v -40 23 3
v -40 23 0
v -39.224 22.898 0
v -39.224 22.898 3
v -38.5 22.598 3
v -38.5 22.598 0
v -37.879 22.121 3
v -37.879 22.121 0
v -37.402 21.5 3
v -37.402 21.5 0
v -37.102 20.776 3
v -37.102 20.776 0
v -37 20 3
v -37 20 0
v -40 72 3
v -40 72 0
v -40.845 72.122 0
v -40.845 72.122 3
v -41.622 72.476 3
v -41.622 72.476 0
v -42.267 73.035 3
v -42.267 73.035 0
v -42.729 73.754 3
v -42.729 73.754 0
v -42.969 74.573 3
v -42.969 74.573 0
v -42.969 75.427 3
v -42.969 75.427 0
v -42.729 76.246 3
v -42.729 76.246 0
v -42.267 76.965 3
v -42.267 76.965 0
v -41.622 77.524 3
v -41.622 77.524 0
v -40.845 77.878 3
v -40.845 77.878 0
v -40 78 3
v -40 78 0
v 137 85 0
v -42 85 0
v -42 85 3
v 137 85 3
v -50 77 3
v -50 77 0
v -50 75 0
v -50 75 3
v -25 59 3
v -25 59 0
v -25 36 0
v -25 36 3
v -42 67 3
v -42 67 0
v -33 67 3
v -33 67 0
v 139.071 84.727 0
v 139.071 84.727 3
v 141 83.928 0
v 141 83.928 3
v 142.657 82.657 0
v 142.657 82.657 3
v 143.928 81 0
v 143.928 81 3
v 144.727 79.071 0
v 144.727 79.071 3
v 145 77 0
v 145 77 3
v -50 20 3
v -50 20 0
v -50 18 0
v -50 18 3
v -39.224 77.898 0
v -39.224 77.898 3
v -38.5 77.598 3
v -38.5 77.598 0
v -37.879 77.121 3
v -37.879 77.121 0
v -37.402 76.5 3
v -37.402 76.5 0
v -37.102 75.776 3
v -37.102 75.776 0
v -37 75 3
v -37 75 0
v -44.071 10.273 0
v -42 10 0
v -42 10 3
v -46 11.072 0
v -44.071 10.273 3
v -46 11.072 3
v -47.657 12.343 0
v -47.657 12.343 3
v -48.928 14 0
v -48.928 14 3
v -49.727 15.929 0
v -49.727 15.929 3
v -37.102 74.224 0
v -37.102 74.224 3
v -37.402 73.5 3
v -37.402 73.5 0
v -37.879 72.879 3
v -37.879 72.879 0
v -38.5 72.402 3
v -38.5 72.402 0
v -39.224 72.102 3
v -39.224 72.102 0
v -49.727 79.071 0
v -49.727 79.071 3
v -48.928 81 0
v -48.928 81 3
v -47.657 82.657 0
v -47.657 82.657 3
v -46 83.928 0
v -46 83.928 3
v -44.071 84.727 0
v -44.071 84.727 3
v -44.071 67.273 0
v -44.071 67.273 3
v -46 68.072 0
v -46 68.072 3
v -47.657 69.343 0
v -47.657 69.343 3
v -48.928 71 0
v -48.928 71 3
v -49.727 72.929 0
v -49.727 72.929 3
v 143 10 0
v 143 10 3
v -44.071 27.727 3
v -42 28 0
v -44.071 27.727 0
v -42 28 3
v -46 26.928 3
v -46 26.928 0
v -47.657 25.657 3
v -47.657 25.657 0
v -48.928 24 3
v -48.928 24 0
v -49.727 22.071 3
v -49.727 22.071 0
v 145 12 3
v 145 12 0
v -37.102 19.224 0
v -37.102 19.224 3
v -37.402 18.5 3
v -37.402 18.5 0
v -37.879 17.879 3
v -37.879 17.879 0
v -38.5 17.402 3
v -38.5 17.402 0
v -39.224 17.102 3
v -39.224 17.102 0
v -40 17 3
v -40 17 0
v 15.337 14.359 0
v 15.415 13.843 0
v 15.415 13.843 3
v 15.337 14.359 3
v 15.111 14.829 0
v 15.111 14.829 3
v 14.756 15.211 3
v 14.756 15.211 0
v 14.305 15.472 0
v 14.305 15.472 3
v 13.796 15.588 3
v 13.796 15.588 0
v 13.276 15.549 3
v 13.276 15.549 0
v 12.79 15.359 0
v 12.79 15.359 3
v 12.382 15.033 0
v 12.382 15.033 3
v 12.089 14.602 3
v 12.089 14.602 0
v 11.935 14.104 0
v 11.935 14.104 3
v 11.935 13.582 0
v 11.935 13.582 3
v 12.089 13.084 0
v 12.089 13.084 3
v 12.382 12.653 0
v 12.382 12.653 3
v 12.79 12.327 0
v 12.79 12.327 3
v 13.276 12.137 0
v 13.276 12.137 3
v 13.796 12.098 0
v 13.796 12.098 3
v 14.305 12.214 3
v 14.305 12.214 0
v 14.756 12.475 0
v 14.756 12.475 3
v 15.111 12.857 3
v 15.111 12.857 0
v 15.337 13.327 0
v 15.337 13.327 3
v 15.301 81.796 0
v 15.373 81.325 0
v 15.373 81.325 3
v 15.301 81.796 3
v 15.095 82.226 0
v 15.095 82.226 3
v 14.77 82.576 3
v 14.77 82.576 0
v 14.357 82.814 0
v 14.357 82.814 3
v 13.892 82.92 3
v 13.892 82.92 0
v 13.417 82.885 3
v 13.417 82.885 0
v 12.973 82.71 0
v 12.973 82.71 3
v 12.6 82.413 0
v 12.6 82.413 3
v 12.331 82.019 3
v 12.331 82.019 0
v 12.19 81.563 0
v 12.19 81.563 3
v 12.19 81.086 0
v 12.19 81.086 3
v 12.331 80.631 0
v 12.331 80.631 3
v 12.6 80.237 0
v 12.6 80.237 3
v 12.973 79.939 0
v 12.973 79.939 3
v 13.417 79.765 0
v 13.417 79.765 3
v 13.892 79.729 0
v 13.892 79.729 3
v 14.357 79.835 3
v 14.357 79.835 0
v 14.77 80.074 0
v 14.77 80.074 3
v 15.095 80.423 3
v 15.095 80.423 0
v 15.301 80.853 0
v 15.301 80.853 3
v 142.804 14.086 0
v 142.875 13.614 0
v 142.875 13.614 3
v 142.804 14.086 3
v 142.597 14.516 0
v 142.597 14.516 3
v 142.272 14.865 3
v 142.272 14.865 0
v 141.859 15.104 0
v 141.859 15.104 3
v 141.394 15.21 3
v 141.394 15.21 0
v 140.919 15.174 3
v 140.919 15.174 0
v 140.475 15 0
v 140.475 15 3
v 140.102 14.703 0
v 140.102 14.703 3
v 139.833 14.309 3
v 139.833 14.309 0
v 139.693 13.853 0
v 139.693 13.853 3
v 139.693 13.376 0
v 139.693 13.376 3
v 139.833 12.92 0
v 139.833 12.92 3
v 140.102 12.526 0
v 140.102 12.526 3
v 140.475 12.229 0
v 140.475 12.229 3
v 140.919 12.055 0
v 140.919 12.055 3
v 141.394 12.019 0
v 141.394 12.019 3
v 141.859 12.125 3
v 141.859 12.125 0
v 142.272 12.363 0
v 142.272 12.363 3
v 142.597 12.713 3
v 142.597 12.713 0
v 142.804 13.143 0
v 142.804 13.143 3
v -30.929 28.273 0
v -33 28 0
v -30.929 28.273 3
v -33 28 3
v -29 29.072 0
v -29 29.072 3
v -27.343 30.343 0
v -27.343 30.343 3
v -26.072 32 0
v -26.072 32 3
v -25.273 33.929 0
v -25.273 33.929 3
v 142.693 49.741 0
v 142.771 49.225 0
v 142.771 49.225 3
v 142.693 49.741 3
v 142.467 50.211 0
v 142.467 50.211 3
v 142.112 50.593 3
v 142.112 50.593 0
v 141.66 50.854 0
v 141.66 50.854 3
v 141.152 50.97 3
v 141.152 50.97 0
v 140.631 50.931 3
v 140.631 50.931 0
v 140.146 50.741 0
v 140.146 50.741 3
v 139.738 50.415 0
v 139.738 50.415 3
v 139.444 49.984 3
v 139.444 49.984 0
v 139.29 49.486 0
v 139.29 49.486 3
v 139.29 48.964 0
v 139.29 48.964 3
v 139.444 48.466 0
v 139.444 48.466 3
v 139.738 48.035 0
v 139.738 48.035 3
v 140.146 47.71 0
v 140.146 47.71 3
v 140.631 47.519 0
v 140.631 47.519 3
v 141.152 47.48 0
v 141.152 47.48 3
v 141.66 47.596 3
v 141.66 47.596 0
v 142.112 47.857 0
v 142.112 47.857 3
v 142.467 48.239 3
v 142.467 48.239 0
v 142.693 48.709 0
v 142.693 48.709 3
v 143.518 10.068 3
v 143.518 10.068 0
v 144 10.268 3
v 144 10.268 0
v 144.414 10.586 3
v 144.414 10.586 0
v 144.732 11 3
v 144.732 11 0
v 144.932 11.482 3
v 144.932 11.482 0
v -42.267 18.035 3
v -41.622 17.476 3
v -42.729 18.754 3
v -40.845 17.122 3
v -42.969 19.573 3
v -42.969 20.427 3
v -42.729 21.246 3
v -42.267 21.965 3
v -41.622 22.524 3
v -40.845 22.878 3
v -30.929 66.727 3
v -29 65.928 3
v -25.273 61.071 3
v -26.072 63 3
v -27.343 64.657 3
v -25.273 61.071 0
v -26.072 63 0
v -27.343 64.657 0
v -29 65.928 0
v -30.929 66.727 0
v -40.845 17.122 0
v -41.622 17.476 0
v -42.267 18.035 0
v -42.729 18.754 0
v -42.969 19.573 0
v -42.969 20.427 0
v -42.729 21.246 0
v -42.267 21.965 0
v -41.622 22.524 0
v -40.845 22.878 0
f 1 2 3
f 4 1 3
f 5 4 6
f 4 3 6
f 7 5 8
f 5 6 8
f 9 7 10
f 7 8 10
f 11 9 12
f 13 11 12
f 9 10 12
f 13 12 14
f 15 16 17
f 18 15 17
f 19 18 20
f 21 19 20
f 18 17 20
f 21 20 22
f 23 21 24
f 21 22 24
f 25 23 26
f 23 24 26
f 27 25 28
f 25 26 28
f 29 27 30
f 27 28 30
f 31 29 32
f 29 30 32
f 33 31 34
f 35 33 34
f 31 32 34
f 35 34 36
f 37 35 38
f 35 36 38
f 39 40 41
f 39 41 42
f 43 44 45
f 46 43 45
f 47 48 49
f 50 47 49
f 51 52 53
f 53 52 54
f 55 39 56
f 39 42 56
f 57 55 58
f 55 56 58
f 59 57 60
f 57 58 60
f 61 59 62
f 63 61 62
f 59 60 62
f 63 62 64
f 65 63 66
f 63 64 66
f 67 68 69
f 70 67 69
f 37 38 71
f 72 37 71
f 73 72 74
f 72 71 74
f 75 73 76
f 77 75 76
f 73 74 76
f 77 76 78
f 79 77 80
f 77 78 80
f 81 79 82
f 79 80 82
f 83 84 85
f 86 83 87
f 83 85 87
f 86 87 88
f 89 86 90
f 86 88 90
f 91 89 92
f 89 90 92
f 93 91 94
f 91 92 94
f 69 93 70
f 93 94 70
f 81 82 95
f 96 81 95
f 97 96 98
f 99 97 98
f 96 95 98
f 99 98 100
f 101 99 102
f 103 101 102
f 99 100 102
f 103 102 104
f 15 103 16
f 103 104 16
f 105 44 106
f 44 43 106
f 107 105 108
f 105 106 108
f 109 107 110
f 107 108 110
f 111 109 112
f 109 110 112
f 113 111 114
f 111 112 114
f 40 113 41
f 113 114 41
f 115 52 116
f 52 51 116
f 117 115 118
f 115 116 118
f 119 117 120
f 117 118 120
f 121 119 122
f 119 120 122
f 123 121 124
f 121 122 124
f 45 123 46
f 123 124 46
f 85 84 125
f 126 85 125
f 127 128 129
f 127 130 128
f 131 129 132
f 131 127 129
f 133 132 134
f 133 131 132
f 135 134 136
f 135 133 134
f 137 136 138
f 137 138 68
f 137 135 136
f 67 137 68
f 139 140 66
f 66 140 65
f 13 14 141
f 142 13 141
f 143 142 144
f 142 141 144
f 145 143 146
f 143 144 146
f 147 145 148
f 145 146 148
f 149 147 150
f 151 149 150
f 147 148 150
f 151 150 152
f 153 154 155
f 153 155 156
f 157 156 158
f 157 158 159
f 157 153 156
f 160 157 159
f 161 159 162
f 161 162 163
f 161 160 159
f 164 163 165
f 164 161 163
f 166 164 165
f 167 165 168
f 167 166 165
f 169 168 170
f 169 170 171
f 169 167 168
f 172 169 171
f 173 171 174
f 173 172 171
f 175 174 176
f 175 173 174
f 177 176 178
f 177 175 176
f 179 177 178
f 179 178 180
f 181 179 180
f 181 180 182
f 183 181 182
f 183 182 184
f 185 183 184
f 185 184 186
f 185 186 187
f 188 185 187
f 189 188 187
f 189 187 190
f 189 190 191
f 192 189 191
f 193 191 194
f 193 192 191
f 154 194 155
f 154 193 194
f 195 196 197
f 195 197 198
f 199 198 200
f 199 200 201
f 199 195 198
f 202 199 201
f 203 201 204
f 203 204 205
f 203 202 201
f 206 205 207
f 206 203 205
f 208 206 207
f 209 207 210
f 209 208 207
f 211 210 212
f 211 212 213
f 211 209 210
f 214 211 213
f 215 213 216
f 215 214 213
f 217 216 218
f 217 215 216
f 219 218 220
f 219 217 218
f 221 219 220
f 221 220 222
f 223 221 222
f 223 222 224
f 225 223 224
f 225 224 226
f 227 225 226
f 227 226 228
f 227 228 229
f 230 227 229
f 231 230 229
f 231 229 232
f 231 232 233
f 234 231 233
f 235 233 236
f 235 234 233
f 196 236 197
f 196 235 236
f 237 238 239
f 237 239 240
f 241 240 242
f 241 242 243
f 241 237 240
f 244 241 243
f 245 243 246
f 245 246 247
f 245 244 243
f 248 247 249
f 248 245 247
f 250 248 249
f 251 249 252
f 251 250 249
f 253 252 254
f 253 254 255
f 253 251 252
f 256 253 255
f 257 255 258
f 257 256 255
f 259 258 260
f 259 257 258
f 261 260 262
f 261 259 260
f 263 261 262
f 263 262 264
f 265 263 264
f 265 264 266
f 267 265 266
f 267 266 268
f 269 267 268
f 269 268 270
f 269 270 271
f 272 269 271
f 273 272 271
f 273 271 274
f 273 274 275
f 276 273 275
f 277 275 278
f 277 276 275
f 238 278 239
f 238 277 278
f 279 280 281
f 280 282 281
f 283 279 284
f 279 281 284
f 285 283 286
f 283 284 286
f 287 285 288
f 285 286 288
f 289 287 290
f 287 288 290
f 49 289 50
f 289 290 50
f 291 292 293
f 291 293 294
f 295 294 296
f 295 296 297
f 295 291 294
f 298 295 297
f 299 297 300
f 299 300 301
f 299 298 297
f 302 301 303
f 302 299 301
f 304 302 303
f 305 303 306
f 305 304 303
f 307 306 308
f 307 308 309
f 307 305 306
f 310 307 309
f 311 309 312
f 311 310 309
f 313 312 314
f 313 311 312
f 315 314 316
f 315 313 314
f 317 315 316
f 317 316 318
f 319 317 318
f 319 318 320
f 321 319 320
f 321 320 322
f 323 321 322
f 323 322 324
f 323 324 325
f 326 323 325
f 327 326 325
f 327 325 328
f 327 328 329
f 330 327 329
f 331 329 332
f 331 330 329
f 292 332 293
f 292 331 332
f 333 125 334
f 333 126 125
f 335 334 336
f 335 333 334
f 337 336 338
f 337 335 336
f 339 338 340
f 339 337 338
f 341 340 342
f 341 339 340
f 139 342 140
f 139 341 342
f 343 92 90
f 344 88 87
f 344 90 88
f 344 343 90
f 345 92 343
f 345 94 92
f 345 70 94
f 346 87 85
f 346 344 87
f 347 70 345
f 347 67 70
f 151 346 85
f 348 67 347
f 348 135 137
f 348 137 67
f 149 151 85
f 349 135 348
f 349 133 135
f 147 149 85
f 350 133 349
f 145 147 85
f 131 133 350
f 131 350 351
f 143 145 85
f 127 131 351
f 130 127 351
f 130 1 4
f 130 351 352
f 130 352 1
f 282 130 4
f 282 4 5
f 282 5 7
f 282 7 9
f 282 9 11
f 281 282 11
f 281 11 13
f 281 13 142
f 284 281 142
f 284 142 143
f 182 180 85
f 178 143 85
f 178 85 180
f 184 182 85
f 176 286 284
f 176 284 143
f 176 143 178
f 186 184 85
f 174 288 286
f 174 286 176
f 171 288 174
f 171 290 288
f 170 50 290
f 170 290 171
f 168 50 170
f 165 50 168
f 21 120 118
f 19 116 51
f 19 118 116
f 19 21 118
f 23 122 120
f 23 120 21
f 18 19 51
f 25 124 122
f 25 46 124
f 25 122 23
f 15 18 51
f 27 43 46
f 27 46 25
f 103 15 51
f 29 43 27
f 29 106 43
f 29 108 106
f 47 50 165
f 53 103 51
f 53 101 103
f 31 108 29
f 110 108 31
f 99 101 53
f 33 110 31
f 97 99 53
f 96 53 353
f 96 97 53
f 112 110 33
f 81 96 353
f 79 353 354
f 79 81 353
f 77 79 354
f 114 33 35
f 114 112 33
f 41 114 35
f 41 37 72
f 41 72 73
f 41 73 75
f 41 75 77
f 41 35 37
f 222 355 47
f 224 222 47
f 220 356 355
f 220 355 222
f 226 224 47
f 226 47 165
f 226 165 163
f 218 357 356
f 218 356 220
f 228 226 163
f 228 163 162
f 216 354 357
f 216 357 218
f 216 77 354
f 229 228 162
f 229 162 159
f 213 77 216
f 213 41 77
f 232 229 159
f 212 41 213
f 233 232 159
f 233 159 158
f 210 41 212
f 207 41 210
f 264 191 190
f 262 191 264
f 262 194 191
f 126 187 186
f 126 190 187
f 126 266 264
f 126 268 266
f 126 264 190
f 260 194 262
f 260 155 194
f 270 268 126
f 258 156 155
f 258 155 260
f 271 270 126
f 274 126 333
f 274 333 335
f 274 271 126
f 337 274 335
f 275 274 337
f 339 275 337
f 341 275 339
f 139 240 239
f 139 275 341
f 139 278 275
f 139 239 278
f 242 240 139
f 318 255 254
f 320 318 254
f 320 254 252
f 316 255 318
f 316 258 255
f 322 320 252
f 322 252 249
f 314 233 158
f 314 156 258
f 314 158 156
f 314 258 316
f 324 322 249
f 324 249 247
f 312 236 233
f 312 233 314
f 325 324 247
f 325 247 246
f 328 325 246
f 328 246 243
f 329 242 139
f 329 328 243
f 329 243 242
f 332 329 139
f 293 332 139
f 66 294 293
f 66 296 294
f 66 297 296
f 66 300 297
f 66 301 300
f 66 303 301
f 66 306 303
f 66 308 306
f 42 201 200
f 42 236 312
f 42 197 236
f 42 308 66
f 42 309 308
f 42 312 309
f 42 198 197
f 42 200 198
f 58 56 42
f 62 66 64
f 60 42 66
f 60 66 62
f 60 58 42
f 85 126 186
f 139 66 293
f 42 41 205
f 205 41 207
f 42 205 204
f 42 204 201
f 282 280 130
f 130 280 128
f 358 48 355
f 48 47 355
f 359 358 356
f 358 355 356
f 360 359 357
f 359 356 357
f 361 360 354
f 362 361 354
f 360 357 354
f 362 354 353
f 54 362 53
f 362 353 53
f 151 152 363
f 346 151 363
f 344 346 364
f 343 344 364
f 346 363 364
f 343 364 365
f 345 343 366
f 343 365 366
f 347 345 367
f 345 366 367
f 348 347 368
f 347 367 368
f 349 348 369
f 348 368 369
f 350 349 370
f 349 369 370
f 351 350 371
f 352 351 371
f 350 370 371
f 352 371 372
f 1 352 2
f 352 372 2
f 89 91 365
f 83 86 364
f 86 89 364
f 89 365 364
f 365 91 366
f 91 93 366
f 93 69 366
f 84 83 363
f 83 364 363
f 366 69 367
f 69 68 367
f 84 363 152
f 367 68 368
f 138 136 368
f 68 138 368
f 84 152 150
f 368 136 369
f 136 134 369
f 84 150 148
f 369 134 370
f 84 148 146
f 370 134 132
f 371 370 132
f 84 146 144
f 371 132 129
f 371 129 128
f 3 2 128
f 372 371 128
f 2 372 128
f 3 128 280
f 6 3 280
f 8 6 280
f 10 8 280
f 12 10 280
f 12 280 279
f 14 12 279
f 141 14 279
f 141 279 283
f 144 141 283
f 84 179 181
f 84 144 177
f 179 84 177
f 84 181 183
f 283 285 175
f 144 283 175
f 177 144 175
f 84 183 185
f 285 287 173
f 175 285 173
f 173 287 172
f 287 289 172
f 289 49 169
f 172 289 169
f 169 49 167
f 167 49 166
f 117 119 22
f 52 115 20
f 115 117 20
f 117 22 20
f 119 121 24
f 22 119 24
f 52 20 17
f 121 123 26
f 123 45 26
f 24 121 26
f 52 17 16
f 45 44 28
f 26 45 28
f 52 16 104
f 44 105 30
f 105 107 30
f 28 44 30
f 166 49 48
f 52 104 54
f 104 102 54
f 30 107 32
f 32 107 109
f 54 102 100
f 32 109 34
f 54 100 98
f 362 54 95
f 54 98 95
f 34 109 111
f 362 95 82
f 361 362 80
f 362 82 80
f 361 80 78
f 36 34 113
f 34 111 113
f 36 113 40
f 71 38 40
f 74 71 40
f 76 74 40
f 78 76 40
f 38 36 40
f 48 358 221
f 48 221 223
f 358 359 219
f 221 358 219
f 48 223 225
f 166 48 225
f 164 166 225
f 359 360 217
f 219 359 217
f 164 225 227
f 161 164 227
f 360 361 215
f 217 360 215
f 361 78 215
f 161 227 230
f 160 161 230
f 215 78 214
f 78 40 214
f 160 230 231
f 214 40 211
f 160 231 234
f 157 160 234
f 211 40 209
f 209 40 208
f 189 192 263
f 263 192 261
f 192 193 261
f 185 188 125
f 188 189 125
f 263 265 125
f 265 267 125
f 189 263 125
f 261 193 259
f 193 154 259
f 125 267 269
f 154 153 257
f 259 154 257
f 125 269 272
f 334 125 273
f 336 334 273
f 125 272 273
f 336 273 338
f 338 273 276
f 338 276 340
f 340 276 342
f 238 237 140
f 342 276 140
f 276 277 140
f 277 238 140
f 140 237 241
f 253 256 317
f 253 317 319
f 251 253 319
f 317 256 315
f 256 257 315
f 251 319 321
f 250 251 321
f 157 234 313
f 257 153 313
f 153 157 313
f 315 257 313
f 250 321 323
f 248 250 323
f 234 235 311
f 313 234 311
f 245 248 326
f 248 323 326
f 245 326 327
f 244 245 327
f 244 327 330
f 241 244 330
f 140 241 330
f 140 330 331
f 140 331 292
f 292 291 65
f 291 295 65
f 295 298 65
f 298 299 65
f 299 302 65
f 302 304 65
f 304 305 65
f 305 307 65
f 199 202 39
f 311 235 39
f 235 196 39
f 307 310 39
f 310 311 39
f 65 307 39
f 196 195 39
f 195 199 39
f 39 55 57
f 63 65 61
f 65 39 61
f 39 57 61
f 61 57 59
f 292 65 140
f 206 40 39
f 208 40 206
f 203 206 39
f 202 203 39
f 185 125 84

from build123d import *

# Parameters (mm, degrees)
SKETCH3_W           = 134.999984
SKETCH3_H           = 75.0000024
SKETCH3_R           = 1.5999968
SKETCH3_R_2         = 1.7499965
BOSS_EXTRUDE1_DEPTH = 3
FILLET1_R           = 8
FILLET2_R           = 2


with BuildPart() as part:
    # Sketch3 → Boss-Extrude1 (new body)
    # profile 1 of 4: a face of its own
    with BuildSketch(Plane.XY):
        with BuildLine():
            Line((10.0000054, 85.0000078), (-39.9999946, 85.0000078))
            Line((-39.9999946, 85.0000078), (-39.9999946, 78.0000078))
            ThreePointArc((-39.9999946, 78.0000078), (-37.878674256, 77.121328144), (-36.9999946, 75.0000078))
            ThreePointArc((-36.9999946, 75.0000078), (-37.878674256, 72.878687456), (-39.9999946, 72.0000078))
            Line((-39.9999946, 72.0000078), (-39.9999946, 67.0000078))
            Line((-39.9999946, 67.0000078), (-24.9999946, 67.0000078))
            Line((-24.9999946, 67.0000078), (-24.9999946, 28.0000054))
            Line((-24.9999946, 28.0000054), (-39.9999946, 28.0000054))
            Line((-39.9999946, 28.0000054), (-39.9999946, 23.0000054))
            ThreePointArc((-39.9999946, 23.0000054), (-37.878674256, 22.121325744), (-36.9999946, 20.0000054))
            ThreePointArc((-36.9999946, 20.0000054), (-37.878674256, 17.878685056), (-39.9999946, 17.0000054))
            Line((-39.9999946, 17.0000054), (-39.9999946, 10.0000054))
            Line((-39.9999946, 10.0000054), (10.0000054, 10.0000054))
            Line((10.0000054, 10.0000054), (10.0000054, 85.0000078))
        make_face()
    # profile 2 of 4: a face of its own
    with BuildSketch(Plane.XY):
        with BuildLine():
            Line((-39.9999946, 78.0000078), (-39.9999946, 85.0000078))
            Line((-39.9999946, 85.0000078), (-49.9999946, 85.0000078))
            Line((-49.9999946, 85.0000078), (-49.9999946, 67.0000078))
            Line((-49.9999946, 67.0000078), (-39.9999946, 67.0000078))
            Line((-39.9999946, 67.0000078), (-39.9999946, 72.0000078))
            ThreePointArc((-39.9999946, 72.0000078), (-42.9999946, 75.0000078), (-39.9999946, 78.0000078))
        make_face()
    # profile 3 of 4: a face of its own
    with BuildSketch(Plane.XY):
        with BuildLine():
            Line((-49.9999946, 10.0000054), (-39.9999946, 10.0000054))
            Line((-39.9999946, 10.0000054), (-39.9999946, 17.0000054))
            ThreePointArc((-39.9999946, 17.0000054), (-42.9999946, 20.0000054), (-39.9999946, 23.0000054))
            Line((-39.9999946, 23.0000054), (-39.9999946, 28.0000054))
            Line((-39.9999946, 28.0000054), (-49.9999946, 28.0000054))
            Line((-49.9999946, 28.0000054), (-49.9999946, 10.0000054))
        make_face()
    # profile 4 of 4: a face of its own
    with BuildSketch(Plane.XY):
        with Locations((77.4999974, 47.5000066)):
            Rectangle(SKETCH3_W, SKETCH3_H)
        with Locations((141.2748, 13.6144)):
            Circle(SKETCH3_R, mode=Mode.SUBTRACT)
        with Locations((141.0208, 49.2252)):
            Circle(SKETCH3_R_2, mode=Mode.SUBTRACT)
        with Locations((13.7725658, 81.3248056)):
            Circle(SKETCH3_R, mode=Mode.SUBTRACT)
        with Locations((13.6652, 13.843)):
            Circle(SKETCH3_R_2, mode=Mode.SUBTRACT)
    extrude(amount=BOSS_EXTRUDE1_DEPTH)

    # Fillet1
    fillet1_edges = [part.edges().sort_by_distance(p)[0] for p in [
        (144.9999894, 85.0000078, 1.5),
        (-49.9999946, 10.0000054, 1.5),
        (-49.9999946, 28.0000054, 1.5),
        (-24.9999946, 28.0000054, 1.5),
        (-24.9999946, 67.0000078, 1.5),
        (-49.9999946, 67.0000078, 1.5),
        (-49.9999946, 85.0000078, 1.5),
    ]]
    fillet(fillet1_edges, radius=FILLET1_R)

    # Fillet2
    fillet2_edges = [part.edges().sort_by_distance(p)[0] for p in [
        (144.9999894, 10.0000054, 1.5),
    ]]
    fillet(fillet2_edges, radius=FILLET2_R)


solid = part.part
